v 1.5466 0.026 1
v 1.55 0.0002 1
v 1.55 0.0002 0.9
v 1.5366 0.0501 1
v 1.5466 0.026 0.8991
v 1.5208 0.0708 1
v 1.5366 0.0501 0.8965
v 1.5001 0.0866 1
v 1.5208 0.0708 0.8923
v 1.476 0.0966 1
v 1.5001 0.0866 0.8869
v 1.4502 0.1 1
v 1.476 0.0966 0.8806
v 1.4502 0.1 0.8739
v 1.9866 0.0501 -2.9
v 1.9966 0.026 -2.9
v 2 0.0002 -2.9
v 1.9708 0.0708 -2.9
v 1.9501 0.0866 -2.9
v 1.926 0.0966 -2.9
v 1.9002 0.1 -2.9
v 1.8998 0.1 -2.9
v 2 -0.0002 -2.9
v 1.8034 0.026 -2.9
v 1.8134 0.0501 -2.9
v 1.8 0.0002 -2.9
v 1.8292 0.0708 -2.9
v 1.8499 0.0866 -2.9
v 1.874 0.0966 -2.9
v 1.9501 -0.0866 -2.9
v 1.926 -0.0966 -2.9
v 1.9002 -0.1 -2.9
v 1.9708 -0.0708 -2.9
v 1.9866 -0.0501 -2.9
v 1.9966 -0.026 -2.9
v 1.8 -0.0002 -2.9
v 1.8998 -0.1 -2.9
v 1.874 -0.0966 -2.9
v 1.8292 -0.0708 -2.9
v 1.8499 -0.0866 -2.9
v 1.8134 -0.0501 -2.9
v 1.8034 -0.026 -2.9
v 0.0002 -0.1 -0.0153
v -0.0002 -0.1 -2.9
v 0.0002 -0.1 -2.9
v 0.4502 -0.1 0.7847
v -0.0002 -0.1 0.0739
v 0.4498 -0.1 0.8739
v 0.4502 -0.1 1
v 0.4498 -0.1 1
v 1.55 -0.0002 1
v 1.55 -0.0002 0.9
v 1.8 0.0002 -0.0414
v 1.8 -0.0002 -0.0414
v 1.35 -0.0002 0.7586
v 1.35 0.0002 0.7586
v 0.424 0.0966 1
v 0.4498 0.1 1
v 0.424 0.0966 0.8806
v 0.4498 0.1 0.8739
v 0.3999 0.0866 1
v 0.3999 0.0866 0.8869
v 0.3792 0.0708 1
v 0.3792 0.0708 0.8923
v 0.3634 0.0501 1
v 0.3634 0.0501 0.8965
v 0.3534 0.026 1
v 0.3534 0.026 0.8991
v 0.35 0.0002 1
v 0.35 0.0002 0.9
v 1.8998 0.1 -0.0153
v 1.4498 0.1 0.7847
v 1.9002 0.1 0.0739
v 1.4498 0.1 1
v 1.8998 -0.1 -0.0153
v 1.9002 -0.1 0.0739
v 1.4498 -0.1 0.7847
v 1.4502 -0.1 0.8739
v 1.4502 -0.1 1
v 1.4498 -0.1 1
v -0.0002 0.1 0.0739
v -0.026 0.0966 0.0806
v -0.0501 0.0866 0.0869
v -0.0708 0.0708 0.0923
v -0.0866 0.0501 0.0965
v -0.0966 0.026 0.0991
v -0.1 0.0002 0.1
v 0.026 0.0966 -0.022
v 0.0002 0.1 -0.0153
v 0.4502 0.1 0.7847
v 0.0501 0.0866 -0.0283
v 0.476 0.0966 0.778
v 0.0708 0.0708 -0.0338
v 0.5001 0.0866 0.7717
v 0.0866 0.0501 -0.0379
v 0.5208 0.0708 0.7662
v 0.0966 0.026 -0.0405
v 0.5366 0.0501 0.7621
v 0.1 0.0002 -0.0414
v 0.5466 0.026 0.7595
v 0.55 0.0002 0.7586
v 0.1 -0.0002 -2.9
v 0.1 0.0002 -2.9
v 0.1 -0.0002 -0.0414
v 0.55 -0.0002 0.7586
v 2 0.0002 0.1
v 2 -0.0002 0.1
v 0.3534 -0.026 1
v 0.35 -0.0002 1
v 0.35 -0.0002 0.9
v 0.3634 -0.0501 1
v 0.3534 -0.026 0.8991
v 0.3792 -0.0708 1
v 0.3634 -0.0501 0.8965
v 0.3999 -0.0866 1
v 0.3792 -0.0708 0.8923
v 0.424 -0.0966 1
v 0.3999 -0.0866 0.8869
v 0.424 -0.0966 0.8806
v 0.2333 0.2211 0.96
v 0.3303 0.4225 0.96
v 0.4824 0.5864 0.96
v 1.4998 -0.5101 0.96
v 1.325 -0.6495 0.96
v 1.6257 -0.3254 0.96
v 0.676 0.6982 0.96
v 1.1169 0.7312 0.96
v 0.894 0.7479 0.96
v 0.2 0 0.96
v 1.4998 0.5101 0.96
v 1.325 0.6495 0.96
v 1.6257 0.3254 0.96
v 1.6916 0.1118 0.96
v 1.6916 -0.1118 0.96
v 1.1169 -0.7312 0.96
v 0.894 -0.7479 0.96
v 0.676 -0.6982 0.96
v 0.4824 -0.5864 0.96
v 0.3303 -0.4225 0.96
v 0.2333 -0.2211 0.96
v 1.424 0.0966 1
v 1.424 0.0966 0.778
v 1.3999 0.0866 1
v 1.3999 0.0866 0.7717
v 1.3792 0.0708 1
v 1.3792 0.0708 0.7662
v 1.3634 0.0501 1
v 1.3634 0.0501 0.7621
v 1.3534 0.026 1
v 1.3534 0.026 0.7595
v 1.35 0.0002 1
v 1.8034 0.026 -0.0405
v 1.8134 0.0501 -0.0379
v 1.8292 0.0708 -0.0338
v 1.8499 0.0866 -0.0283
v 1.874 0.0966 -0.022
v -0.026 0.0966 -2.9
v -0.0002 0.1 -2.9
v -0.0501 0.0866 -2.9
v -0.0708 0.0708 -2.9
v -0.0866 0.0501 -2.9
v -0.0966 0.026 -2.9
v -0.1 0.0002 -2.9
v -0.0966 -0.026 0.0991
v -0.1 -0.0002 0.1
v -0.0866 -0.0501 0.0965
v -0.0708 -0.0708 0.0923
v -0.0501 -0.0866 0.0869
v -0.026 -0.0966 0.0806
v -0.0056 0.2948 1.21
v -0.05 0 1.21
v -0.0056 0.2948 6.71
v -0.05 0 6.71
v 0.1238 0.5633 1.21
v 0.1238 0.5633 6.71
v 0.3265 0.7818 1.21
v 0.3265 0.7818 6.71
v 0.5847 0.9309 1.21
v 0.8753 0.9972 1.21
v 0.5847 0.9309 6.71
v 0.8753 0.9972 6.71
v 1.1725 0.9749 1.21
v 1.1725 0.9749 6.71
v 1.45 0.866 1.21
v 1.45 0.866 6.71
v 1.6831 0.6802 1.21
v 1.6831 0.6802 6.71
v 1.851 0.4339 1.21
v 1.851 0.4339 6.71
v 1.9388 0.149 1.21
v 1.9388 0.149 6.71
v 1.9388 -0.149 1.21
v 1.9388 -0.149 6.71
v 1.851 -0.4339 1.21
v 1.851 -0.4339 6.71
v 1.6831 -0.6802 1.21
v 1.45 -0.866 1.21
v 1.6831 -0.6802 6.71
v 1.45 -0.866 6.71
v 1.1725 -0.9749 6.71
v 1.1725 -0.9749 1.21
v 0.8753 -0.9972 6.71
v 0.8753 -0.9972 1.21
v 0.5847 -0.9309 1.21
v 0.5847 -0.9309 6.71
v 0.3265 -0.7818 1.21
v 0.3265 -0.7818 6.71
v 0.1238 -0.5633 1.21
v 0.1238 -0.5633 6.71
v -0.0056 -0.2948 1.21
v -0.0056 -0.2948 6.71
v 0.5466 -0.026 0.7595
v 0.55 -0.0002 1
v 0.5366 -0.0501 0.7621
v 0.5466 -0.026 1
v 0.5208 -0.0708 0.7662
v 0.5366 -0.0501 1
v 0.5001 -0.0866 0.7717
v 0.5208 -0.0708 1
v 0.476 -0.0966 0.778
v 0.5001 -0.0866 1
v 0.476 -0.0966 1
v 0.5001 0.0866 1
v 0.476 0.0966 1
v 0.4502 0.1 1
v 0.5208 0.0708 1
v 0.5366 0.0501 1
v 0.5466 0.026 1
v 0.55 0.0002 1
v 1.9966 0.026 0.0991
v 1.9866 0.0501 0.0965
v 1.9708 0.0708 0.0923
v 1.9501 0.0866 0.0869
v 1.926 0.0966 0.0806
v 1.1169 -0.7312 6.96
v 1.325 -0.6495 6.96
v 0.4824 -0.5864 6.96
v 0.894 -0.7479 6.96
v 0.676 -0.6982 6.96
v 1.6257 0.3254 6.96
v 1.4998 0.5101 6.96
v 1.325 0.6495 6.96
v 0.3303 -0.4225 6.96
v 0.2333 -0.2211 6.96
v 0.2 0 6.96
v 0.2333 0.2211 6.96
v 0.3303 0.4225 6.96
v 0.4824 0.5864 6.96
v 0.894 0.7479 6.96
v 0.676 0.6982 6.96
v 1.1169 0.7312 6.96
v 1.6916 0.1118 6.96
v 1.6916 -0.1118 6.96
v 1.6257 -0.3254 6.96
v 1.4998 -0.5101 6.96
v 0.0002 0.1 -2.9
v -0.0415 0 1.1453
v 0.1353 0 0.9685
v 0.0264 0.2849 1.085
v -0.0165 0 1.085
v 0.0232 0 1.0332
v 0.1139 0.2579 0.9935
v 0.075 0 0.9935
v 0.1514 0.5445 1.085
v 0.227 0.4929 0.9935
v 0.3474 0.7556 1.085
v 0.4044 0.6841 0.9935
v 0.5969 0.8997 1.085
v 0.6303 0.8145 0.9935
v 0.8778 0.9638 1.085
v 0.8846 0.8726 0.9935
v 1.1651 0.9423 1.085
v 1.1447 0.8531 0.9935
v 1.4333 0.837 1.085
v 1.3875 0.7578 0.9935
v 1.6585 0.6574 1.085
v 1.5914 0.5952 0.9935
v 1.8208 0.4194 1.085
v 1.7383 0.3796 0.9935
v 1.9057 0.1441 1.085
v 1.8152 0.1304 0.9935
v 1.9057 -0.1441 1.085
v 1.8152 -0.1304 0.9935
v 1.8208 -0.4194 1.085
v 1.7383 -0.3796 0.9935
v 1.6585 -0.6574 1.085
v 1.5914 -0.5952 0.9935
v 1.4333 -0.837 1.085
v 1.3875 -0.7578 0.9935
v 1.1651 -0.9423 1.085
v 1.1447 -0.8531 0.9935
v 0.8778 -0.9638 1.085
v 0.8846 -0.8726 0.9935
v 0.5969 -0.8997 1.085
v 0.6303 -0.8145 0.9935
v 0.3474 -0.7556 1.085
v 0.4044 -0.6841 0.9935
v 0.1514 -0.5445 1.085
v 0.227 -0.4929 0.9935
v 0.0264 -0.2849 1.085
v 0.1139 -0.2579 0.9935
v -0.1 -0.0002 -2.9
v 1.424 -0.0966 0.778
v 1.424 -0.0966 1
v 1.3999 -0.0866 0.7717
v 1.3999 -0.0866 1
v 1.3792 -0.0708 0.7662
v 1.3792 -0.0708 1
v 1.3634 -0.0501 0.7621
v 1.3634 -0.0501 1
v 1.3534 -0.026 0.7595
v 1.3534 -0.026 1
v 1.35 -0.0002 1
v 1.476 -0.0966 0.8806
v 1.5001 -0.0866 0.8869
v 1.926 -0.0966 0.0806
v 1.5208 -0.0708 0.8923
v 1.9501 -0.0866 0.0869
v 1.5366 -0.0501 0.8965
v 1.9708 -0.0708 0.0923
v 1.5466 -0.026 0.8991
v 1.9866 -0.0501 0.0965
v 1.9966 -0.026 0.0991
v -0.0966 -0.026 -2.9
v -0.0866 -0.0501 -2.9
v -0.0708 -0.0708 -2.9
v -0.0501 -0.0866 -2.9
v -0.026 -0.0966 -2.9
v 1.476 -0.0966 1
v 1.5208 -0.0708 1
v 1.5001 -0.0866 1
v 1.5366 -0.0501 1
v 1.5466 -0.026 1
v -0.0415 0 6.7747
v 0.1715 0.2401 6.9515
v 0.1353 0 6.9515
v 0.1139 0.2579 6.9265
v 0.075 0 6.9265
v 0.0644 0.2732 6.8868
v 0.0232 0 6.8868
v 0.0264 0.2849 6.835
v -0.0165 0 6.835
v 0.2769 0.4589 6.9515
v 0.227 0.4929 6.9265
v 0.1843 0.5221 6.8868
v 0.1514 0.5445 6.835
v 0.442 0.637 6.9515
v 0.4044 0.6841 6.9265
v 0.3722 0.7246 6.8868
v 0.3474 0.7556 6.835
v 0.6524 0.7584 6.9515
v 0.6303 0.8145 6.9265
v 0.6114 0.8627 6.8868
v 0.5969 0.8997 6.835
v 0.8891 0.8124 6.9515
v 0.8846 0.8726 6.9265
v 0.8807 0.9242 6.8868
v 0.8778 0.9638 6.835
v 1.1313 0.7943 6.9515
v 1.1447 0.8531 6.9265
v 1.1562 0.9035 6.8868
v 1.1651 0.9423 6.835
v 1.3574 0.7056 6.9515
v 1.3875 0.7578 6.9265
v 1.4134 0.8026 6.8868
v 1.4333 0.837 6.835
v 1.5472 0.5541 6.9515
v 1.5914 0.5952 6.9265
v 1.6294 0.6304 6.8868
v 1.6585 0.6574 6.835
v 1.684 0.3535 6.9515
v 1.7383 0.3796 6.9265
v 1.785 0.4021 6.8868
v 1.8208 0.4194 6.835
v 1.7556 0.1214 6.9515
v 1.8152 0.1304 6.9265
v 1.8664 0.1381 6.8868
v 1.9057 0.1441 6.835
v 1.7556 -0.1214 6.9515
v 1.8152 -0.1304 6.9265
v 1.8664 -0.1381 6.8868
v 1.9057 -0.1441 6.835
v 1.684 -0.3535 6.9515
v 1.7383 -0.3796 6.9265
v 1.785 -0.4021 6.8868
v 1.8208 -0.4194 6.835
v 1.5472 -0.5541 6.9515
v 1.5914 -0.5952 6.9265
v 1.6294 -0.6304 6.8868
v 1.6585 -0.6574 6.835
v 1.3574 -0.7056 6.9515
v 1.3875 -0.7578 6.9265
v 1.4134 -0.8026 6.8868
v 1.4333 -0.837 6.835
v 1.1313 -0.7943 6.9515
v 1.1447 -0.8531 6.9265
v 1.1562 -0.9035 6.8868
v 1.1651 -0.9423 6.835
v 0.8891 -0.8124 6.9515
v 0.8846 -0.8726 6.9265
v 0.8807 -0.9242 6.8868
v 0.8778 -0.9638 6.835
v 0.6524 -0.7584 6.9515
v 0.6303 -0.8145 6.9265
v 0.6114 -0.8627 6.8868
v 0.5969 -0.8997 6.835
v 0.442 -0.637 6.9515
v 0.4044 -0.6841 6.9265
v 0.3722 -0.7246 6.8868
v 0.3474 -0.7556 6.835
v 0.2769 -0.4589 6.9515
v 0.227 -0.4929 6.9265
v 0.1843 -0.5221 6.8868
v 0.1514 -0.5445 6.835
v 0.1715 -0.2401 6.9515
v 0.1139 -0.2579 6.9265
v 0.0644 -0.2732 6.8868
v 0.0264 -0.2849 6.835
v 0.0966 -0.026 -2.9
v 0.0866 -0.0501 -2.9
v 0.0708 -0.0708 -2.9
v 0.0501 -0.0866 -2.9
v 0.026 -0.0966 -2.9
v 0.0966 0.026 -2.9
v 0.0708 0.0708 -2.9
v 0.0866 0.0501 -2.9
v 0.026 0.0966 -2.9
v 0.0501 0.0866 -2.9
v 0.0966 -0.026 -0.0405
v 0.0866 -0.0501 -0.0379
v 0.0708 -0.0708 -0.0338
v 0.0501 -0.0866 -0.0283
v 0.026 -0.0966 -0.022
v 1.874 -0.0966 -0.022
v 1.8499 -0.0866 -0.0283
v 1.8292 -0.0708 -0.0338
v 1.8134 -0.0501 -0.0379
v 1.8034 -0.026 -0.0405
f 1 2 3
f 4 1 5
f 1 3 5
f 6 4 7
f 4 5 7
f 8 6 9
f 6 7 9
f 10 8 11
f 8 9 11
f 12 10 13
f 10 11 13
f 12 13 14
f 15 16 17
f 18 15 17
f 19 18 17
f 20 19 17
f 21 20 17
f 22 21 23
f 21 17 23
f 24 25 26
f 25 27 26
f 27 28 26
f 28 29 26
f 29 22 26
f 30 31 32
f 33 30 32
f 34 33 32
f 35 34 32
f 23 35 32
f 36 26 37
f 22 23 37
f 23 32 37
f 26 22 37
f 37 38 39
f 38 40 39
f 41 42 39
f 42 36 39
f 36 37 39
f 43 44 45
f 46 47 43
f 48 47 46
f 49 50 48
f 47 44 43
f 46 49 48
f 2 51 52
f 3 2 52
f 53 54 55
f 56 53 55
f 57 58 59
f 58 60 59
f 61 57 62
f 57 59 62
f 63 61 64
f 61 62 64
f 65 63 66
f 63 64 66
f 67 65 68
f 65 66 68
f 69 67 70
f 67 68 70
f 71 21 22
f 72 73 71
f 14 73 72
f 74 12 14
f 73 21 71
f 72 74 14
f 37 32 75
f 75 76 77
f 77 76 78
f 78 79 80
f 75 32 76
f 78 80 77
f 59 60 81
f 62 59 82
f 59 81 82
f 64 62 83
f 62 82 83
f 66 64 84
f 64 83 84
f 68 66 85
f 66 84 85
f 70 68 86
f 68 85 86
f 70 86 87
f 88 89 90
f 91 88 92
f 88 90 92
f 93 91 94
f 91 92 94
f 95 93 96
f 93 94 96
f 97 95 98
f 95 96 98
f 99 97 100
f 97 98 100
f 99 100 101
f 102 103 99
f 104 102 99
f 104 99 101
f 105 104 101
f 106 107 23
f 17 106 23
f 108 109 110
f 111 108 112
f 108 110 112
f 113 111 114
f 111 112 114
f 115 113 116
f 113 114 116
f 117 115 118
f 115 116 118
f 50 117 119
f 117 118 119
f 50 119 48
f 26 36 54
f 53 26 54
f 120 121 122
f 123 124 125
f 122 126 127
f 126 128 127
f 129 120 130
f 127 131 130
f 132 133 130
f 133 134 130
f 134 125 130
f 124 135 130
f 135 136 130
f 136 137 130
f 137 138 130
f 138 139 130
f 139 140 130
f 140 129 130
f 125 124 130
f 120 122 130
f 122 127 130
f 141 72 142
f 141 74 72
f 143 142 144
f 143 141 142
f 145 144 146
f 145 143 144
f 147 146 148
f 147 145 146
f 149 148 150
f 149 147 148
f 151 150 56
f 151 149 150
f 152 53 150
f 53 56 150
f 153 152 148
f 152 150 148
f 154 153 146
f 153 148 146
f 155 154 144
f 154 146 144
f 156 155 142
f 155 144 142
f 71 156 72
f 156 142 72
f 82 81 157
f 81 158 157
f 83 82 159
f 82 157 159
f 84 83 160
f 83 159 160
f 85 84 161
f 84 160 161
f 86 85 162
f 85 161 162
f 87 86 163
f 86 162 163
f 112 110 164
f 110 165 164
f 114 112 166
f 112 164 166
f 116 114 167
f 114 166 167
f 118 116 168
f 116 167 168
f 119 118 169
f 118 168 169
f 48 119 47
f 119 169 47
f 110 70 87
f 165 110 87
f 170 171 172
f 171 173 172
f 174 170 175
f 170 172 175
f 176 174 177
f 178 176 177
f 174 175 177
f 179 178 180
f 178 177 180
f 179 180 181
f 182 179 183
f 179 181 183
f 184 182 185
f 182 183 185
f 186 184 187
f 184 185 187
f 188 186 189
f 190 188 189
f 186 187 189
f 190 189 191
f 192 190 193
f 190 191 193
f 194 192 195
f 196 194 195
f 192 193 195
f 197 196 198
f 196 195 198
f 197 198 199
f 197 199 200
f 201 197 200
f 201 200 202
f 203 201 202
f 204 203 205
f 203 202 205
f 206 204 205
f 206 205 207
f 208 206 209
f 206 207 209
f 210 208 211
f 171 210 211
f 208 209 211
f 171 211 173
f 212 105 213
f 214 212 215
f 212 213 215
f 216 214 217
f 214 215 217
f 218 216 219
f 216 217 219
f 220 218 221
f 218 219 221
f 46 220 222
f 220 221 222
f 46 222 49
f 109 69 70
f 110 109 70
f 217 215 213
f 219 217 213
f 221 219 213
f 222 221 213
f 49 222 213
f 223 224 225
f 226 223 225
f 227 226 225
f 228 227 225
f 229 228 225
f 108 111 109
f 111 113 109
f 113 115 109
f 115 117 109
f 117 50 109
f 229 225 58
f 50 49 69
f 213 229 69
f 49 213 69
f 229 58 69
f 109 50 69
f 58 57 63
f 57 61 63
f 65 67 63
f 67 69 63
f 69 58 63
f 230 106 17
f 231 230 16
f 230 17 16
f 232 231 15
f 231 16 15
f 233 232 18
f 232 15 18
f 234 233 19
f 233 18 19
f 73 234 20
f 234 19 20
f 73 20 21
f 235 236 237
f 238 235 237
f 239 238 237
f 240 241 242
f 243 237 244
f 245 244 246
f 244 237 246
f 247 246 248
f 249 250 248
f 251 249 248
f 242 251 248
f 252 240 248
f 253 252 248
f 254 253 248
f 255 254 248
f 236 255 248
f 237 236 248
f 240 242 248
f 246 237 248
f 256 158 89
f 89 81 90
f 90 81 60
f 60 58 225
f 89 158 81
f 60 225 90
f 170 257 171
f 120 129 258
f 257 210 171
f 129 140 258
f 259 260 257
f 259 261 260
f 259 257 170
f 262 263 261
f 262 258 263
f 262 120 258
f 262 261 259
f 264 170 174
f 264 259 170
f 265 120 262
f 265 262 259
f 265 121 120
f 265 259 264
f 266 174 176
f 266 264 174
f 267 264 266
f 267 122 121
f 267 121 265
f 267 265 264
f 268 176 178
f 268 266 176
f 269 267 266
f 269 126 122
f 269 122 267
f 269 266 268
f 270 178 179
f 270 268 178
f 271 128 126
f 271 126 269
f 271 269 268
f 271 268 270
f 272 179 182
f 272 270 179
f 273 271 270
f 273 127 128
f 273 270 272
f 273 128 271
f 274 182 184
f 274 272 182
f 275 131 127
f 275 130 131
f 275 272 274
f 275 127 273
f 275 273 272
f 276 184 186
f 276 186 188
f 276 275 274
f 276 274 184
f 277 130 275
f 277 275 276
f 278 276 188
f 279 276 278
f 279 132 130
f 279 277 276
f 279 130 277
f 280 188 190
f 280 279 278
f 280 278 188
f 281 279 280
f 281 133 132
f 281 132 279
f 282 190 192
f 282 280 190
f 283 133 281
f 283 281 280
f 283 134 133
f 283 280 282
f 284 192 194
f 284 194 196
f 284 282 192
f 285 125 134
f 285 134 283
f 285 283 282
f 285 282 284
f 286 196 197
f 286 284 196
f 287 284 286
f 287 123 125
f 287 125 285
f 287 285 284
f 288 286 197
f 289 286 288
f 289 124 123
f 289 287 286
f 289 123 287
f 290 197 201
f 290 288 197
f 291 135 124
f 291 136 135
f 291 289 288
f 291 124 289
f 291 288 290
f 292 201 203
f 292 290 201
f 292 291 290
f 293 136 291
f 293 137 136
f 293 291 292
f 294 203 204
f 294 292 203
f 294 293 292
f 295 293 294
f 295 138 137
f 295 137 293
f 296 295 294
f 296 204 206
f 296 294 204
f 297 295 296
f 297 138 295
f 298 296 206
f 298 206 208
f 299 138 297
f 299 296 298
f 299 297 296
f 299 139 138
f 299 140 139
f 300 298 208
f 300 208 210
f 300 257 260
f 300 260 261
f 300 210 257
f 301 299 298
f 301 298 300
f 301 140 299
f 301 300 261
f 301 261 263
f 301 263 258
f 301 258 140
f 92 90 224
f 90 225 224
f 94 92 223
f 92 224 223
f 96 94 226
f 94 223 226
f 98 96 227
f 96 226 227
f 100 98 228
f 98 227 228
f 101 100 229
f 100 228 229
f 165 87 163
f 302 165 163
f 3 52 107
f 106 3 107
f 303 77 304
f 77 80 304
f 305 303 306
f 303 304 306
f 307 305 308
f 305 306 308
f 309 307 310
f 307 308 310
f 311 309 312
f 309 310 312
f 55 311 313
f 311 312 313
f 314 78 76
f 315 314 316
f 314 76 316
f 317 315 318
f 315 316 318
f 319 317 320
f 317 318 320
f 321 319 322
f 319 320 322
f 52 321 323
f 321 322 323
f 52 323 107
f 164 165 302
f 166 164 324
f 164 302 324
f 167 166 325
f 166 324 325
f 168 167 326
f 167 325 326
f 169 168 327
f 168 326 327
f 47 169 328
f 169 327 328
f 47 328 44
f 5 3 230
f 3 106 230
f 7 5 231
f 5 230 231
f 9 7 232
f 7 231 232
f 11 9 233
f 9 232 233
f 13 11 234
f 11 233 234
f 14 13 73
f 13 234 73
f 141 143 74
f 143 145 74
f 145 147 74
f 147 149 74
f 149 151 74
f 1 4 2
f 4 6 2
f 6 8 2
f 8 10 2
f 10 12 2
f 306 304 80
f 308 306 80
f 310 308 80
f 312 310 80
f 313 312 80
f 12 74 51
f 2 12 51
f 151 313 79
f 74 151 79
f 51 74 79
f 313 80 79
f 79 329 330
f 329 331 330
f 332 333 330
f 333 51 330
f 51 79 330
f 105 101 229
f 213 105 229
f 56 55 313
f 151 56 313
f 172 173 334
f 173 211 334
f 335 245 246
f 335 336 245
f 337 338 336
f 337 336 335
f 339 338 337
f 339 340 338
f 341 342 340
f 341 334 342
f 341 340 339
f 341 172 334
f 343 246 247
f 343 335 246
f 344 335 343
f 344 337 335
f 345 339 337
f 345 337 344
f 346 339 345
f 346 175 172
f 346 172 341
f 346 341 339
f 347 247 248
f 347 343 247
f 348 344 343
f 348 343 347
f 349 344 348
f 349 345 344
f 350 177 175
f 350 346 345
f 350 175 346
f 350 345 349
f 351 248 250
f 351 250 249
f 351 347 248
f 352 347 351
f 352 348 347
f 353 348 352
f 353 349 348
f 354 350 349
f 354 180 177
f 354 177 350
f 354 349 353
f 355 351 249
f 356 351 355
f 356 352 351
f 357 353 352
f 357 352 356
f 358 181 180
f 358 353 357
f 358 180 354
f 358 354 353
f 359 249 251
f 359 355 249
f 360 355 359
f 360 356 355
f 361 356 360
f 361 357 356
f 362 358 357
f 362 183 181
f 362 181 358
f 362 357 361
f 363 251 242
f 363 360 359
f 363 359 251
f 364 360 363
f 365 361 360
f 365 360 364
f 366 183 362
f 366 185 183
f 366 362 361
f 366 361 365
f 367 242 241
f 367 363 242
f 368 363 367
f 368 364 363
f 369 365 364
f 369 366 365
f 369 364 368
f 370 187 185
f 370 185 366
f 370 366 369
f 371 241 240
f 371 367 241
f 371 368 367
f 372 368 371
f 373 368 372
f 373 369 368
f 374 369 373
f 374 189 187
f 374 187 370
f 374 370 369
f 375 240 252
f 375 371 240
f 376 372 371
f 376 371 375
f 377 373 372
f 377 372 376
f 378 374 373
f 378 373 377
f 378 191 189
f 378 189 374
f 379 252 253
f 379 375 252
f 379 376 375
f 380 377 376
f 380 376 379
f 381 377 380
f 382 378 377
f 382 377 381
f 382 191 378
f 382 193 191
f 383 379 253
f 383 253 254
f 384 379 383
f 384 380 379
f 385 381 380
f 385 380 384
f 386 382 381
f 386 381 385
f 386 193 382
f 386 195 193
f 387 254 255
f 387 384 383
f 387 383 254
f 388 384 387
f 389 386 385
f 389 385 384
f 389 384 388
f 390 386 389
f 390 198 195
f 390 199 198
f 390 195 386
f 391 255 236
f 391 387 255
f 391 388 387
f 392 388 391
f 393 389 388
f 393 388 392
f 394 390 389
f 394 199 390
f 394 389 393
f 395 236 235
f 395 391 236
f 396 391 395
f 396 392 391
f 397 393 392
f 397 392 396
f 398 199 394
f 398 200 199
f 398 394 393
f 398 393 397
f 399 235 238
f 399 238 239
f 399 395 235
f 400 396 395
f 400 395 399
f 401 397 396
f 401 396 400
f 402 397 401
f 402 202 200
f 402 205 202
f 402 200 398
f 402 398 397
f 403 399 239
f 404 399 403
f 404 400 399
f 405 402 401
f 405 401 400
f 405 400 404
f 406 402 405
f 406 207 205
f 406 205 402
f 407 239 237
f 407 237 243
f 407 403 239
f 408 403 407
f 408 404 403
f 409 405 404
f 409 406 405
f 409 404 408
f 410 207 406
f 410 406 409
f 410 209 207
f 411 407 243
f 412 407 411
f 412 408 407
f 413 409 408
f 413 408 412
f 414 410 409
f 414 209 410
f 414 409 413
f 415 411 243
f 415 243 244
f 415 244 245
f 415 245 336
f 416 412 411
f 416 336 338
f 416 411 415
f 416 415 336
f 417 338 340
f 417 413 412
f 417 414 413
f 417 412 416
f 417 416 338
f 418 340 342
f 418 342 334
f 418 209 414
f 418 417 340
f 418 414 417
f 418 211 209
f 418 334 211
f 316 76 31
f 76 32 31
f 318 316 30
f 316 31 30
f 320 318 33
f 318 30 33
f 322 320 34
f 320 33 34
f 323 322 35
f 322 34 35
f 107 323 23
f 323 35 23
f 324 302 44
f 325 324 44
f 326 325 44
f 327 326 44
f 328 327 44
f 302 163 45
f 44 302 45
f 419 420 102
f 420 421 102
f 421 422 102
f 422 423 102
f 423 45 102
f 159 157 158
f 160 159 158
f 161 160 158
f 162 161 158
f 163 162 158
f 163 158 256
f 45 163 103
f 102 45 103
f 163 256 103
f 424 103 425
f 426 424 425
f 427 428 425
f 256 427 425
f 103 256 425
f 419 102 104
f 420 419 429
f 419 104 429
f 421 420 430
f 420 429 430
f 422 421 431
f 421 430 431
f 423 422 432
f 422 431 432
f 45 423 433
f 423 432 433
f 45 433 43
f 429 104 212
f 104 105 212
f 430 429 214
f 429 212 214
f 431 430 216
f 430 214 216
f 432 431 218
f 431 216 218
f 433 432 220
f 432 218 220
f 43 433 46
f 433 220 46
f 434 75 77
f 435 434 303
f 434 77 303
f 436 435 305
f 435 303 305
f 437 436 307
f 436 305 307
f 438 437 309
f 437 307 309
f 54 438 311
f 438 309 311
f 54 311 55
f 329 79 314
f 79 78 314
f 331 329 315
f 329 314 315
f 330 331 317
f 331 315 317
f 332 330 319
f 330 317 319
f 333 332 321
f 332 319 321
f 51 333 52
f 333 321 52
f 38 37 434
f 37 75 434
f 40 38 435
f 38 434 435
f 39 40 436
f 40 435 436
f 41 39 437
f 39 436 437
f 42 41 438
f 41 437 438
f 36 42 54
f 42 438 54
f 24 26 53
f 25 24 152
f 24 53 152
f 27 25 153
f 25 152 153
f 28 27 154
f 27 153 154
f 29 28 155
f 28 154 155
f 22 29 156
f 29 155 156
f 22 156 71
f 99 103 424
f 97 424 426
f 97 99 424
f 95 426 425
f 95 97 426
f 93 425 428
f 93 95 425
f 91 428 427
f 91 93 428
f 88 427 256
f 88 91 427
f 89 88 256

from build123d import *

# Parameters (mm, degrees)
PAD_DEPTH = 0.1
FILLET_R  = 0.0998


with BuildPart() as revolution:
    # Sketch002 → Revolution (revolve)
    with BuildSketch(Plane.XZ):
        with BuildLine():
            Line((0.2, 6.96), (0.95, 6.96))
            Line((0.95, 0.96), (0.95, 6.96))
            Line((0.95, 0.96), (0.2, 0.96))
            ThreePointArc((-0.05, 1.21), (0.023223, 1.033223), (0.2, 0.96))
            Line((-0.05, 1.21), (-0.05, 6.71))
            ThreePointArc((0.2, 6.96), (0.023223, 6.886777), (-0.05, 6.71))
        make_face()
    revolve(axis=Axis((0.95, 0, 6.96), (0, 0, -1)))


with BuildPart() as fillet_body:
    # Sketch → Pad (new body, symmetric)
    with BuildSketch(Plane.XZ):
        Polygon((0.1, -2.9), (0.1, -0.041421), (0.55, 0.758579), (0.55, 1), (0.35, 1), (0.35, 0.9), (-0.1, 0.1), (-0.1, -2.9), align=None)
        Polygon((1.35, 1), (1.55, 1), (1.55, 0.9), (2, 0.1), (2, -2.9), (1.8, -2.9), (1.8, -0.041421), (1.35, 0.758579), align=None)
    extrude(amount=PAD_DEPTH, both=True)

    # Fillet
    fillet_edges = [fillet_body.edges().sort_by_distance(p)[0] for p in [
        (0.125, -0.1, 0.5),
        (0.35, -0.1, 0.95),
        (0.55, -0.1, 0.879289),
        (0.325, -0.1, 0.358579),
        (0.1, -0.1, -1.470711),
        (-0.1, -0.1, -1.4),
        (0.1, 0.1, -1.470711),
        (0.325, 0.1, 0.358579),
        (0.55, 0.1, 0.879289),
        (1.575, -0.1, 0.358579),
        (1.35, -0.1, 0.879289),
        (1.8, -0.1, -1.470711),
        (2, -0.1, -1.4),
        (1.775, -0.1, 0.5),
        (1.55, -0.1, 0.95),
        (1.55, 0.1, 0.95),
        (1.775, 0.1, 0.5),
        (2, 0.1, -1.4),
        (1.8, 0.1, -1.470711),
        (1.575, 0.1, 0.358579),
        (1.35, 0.1, 0.879289),
        (0.35, 0.1, 0.95),
        (-0.1, 0.1, -1.4),
        (0.125, 0.1, 0.5),
    ]]
    fillet(fillet_edges, radius=FILLET_R)


solid = Compound([revolution.part, fillet_body.part])
